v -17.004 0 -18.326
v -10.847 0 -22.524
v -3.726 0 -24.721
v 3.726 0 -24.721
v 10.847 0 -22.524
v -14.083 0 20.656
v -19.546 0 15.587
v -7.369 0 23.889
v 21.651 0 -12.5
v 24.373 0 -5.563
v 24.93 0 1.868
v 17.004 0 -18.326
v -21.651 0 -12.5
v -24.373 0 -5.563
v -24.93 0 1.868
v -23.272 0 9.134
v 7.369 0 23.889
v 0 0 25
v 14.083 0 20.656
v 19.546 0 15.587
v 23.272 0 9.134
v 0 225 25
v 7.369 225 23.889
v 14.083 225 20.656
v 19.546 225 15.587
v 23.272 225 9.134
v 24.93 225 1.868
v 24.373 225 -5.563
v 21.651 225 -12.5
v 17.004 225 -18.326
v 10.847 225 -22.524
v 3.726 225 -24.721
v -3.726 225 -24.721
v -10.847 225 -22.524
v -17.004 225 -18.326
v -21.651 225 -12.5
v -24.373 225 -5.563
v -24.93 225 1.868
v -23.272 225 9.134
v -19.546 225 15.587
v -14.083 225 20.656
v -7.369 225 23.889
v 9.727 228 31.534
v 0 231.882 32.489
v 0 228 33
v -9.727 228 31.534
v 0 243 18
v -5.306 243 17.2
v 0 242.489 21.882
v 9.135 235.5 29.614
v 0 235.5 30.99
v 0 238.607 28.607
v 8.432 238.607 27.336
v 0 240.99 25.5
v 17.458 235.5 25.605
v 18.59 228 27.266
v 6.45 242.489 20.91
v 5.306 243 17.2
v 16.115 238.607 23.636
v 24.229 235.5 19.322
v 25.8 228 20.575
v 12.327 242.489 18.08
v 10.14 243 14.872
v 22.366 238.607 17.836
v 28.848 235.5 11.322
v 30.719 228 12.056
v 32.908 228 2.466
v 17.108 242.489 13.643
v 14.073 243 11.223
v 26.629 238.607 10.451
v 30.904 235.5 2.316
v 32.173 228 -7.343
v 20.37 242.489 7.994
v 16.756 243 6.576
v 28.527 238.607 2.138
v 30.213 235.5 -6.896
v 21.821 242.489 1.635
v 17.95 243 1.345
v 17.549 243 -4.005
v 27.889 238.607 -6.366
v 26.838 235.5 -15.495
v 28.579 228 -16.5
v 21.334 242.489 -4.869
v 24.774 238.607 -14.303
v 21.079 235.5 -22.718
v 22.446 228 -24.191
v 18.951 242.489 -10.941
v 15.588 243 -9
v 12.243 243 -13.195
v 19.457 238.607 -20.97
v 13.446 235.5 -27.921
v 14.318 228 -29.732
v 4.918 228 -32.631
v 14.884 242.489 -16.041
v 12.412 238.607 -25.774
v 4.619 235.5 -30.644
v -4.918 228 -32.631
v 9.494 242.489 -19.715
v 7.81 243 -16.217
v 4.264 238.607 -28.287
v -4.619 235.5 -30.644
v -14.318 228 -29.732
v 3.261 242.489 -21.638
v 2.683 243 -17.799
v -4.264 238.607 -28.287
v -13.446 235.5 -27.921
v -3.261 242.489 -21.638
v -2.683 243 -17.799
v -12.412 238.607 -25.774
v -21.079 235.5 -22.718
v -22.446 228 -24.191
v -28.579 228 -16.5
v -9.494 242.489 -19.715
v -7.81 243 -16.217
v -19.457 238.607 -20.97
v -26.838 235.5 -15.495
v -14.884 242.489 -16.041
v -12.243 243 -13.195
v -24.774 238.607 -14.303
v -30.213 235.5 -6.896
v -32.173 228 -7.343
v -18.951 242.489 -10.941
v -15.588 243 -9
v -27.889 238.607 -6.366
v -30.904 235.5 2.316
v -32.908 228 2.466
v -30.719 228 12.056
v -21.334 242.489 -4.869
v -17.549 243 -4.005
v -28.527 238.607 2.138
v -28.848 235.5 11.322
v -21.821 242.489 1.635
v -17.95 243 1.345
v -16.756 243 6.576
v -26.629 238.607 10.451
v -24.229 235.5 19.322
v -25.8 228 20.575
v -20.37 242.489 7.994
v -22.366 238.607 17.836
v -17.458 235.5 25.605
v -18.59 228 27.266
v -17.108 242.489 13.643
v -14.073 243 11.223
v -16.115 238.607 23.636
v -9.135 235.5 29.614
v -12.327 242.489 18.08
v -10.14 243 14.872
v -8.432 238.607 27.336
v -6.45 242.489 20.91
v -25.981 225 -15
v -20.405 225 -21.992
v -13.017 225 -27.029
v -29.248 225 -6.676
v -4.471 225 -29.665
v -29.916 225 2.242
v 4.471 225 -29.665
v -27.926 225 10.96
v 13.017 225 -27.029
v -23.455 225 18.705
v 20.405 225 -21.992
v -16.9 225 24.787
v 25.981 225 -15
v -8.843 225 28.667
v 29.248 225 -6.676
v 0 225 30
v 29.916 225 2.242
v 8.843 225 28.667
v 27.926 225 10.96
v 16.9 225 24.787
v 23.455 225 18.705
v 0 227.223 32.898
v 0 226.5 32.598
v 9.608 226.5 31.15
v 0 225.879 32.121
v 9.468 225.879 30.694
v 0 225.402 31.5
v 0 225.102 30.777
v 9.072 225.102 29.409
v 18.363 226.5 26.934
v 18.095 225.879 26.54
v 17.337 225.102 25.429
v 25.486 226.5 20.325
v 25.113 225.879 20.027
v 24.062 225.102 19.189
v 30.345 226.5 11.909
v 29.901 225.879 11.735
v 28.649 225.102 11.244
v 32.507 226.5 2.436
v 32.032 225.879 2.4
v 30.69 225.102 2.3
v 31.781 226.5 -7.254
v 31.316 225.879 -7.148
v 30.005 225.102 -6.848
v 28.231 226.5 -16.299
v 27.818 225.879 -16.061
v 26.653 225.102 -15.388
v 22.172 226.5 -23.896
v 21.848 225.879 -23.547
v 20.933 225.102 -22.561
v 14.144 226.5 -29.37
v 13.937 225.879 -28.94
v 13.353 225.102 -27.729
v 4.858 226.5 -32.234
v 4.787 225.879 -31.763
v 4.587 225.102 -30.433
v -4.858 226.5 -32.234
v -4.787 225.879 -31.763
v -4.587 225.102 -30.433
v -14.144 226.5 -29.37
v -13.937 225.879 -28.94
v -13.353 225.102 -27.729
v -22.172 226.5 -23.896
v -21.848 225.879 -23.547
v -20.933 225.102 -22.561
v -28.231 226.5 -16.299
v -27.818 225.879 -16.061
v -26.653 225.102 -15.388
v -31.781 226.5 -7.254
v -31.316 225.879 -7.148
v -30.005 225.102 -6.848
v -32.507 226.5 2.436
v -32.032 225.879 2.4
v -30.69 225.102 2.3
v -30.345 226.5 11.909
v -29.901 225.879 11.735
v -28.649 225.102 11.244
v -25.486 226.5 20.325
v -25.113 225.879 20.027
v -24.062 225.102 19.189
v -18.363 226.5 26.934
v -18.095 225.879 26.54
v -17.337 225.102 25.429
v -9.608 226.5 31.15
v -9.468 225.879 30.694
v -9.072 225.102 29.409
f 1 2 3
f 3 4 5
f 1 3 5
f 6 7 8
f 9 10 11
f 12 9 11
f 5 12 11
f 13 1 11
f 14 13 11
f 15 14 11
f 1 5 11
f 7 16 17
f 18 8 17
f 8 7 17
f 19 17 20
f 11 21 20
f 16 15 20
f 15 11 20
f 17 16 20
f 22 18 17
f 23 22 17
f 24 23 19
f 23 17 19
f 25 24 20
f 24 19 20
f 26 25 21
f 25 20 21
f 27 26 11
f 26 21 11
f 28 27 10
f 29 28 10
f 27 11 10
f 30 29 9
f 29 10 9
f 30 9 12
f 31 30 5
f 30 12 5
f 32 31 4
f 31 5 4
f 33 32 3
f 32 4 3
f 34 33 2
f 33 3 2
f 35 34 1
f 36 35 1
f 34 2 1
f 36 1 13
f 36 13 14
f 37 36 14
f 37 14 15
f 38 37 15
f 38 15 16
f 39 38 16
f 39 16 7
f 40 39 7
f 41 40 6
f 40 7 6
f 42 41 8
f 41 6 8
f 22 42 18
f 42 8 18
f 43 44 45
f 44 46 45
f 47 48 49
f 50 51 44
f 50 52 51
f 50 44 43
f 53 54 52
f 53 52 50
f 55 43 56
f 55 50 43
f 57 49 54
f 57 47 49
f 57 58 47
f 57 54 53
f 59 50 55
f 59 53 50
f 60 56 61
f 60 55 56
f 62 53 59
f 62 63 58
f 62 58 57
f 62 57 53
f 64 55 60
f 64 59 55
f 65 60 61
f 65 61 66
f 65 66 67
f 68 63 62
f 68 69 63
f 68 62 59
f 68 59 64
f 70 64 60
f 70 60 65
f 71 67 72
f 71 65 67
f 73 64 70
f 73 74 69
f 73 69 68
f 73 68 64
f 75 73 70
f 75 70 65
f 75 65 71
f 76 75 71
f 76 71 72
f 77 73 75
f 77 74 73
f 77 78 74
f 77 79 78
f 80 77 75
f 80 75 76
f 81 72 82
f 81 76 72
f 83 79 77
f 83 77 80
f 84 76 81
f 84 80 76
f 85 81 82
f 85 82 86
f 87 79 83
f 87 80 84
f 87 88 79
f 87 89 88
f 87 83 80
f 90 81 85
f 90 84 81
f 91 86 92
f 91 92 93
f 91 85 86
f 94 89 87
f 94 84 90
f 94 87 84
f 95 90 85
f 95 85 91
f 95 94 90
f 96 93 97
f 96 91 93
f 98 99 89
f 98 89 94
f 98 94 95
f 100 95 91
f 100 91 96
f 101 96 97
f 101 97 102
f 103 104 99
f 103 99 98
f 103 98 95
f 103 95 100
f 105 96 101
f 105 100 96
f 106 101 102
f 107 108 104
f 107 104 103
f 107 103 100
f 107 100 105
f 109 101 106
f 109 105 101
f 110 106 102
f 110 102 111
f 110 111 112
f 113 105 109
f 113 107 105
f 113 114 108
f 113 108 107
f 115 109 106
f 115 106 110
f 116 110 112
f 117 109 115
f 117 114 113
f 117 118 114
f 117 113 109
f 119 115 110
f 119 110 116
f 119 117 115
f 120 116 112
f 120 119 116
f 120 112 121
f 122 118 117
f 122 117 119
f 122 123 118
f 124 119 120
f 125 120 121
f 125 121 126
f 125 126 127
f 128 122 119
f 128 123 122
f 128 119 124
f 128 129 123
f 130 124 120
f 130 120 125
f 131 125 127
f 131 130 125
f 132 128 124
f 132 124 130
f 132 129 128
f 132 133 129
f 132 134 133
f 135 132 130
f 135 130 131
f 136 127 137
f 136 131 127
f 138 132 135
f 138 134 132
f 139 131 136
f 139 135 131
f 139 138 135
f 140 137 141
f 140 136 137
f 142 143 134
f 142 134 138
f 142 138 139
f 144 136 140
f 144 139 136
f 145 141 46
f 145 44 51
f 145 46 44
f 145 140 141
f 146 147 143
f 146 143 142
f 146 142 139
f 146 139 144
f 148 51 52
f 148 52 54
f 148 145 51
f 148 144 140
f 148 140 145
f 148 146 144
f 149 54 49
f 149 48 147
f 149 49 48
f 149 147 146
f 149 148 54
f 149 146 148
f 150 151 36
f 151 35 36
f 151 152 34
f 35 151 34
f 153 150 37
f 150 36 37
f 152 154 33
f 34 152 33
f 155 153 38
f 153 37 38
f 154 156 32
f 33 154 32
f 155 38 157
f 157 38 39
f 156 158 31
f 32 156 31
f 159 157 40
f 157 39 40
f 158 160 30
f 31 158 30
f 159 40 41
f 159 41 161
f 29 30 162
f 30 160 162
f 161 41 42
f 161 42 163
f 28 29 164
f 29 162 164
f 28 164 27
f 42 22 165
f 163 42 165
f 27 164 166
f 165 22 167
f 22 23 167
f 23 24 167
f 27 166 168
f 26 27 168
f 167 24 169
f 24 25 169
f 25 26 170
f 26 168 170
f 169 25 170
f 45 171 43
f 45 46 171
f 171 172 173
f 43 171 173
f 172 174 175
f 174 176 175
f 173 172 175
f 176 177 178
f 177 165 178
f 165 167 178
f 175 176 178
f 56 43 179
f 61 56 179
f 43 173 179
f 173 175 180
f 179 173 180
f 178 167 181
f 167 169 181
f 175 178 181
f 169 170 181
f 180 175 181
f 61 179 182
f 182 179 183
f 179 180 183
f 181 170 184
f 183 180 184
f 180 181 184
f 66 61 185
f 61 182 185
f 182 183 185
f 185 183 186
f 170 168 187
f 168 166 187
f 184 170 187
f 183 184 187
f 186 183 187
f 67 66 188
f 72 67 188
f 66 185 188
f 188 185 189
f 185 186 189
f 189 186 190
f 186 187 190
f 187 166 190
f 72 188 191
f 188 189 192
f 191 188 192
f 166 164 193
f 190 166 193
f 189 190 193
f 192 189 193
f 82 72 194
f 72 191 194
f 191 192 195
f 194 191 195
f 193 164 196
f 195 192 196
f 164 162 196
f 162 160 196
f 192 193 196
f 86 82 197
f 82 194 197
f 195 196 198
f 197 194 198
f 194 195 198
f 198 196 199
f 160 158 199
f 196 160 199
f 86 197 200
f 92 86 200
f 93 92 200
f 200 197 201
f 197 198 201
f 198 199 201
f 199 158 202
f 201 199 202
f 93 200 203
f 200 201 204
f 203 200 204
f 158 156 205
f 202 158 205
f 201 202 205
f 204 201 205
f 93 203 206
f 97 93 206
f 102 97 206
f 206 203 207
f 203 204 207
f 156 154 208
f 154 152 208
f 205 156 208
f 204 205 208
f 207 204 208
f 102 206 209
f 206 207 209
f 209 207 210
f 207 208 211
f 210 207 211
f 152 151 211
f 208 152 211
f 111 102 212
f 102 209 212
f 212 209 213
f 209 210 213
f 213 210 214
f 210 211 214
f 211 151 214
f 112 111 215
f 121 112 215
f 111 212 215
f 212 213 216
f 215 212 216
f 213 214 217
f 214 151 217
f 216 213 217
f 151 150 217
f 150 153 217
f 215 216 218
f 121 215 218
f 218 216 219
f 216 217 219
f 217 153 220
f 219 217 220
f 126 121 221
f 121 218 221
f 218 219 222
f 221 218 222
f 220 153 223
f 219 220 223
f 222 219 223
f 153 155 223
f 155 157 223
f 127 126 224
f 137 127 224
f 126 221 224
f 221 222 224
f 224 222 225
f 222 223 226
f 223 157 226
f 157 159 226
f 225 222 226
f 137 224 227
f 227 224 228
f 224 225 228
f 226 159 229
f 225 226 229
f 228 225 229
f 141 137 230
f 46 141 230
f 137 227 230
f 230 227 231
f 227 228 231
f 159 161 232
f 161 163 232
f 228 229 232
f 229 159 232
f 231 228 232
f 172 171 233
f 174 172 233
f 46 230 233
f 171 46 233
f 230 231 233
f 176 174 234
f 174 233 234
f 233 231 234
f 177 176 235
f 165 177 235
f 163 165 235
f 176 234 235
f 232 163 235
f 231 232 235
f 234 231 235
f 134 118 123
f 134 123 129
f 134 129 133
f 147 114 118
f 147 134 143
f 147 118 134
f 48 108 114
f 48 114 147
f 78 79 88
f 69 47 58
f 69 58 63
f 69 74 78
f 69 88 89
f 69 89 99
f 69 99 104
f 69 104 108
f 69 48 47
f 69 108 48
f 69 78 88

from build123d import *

# Parameters (mm, degrees)
SZKIC1_R                    = 25
DODANIE_WYCI_GNI_CIE1_DEPTH = 225
SZKIC2_R                    = 33
DODANIE_WYCI_GNI_CIE2_DEPTH = 18
ZAOKR_GLENIE1_R             = 15
ZAOKR_GLENIE2_R             = 3


with BuildPart() as part:
    # Szkic1 → Dodanie-wyciągnięcie1 (new body)
    with BuildSketch(Plane(origin=(0, 0, 0), x_dir=(1, 0, 0), z_dir=(0, 1, 0))):
        with Locations(Location((0, 0, 0), (0, 0, 270))):
            Circle(SZKIC1_R)
    extrude(amount=DODANIE_WYCI_GNI_CIE1_DEPTH)

    # Szkic2 → Dodanie-wyciągnięcie2 (add)
    with BuildSketch(Plane(origin=(0, 225, 0), x_dir=(1, 0, 0), z_dir=(0, 1, 0))):
        with Locations(Location((0, 0, 0), (0, 0, 270))):
            Circle(SZKIC2_R)
    extrude(amount=DODANIE_WYCI_GNI_CIE2_DEPTH)

    # Zaokrąglenie1
    zaokr_glenie1_edges = [part.edges().sort_by_distance(p)[0] for p in [
        (0, 243, -33),
    ]]
    fillet(zaokr_glenie1_edges, radius=ZAOKR_GLENIE1_R)

    # Zaokrąglenie2
    zaokr_glenie2_edges = [part.edges().sort_by_distance(p)[0] for p in [
        (0, 225, -33),
    ]]
    fillet(zaokr_glenie2_edges, radius=ZAOKR_GLENIE2_R - 0.0001)  # a hair under: the kernel refuses the full size


solid = part.part
